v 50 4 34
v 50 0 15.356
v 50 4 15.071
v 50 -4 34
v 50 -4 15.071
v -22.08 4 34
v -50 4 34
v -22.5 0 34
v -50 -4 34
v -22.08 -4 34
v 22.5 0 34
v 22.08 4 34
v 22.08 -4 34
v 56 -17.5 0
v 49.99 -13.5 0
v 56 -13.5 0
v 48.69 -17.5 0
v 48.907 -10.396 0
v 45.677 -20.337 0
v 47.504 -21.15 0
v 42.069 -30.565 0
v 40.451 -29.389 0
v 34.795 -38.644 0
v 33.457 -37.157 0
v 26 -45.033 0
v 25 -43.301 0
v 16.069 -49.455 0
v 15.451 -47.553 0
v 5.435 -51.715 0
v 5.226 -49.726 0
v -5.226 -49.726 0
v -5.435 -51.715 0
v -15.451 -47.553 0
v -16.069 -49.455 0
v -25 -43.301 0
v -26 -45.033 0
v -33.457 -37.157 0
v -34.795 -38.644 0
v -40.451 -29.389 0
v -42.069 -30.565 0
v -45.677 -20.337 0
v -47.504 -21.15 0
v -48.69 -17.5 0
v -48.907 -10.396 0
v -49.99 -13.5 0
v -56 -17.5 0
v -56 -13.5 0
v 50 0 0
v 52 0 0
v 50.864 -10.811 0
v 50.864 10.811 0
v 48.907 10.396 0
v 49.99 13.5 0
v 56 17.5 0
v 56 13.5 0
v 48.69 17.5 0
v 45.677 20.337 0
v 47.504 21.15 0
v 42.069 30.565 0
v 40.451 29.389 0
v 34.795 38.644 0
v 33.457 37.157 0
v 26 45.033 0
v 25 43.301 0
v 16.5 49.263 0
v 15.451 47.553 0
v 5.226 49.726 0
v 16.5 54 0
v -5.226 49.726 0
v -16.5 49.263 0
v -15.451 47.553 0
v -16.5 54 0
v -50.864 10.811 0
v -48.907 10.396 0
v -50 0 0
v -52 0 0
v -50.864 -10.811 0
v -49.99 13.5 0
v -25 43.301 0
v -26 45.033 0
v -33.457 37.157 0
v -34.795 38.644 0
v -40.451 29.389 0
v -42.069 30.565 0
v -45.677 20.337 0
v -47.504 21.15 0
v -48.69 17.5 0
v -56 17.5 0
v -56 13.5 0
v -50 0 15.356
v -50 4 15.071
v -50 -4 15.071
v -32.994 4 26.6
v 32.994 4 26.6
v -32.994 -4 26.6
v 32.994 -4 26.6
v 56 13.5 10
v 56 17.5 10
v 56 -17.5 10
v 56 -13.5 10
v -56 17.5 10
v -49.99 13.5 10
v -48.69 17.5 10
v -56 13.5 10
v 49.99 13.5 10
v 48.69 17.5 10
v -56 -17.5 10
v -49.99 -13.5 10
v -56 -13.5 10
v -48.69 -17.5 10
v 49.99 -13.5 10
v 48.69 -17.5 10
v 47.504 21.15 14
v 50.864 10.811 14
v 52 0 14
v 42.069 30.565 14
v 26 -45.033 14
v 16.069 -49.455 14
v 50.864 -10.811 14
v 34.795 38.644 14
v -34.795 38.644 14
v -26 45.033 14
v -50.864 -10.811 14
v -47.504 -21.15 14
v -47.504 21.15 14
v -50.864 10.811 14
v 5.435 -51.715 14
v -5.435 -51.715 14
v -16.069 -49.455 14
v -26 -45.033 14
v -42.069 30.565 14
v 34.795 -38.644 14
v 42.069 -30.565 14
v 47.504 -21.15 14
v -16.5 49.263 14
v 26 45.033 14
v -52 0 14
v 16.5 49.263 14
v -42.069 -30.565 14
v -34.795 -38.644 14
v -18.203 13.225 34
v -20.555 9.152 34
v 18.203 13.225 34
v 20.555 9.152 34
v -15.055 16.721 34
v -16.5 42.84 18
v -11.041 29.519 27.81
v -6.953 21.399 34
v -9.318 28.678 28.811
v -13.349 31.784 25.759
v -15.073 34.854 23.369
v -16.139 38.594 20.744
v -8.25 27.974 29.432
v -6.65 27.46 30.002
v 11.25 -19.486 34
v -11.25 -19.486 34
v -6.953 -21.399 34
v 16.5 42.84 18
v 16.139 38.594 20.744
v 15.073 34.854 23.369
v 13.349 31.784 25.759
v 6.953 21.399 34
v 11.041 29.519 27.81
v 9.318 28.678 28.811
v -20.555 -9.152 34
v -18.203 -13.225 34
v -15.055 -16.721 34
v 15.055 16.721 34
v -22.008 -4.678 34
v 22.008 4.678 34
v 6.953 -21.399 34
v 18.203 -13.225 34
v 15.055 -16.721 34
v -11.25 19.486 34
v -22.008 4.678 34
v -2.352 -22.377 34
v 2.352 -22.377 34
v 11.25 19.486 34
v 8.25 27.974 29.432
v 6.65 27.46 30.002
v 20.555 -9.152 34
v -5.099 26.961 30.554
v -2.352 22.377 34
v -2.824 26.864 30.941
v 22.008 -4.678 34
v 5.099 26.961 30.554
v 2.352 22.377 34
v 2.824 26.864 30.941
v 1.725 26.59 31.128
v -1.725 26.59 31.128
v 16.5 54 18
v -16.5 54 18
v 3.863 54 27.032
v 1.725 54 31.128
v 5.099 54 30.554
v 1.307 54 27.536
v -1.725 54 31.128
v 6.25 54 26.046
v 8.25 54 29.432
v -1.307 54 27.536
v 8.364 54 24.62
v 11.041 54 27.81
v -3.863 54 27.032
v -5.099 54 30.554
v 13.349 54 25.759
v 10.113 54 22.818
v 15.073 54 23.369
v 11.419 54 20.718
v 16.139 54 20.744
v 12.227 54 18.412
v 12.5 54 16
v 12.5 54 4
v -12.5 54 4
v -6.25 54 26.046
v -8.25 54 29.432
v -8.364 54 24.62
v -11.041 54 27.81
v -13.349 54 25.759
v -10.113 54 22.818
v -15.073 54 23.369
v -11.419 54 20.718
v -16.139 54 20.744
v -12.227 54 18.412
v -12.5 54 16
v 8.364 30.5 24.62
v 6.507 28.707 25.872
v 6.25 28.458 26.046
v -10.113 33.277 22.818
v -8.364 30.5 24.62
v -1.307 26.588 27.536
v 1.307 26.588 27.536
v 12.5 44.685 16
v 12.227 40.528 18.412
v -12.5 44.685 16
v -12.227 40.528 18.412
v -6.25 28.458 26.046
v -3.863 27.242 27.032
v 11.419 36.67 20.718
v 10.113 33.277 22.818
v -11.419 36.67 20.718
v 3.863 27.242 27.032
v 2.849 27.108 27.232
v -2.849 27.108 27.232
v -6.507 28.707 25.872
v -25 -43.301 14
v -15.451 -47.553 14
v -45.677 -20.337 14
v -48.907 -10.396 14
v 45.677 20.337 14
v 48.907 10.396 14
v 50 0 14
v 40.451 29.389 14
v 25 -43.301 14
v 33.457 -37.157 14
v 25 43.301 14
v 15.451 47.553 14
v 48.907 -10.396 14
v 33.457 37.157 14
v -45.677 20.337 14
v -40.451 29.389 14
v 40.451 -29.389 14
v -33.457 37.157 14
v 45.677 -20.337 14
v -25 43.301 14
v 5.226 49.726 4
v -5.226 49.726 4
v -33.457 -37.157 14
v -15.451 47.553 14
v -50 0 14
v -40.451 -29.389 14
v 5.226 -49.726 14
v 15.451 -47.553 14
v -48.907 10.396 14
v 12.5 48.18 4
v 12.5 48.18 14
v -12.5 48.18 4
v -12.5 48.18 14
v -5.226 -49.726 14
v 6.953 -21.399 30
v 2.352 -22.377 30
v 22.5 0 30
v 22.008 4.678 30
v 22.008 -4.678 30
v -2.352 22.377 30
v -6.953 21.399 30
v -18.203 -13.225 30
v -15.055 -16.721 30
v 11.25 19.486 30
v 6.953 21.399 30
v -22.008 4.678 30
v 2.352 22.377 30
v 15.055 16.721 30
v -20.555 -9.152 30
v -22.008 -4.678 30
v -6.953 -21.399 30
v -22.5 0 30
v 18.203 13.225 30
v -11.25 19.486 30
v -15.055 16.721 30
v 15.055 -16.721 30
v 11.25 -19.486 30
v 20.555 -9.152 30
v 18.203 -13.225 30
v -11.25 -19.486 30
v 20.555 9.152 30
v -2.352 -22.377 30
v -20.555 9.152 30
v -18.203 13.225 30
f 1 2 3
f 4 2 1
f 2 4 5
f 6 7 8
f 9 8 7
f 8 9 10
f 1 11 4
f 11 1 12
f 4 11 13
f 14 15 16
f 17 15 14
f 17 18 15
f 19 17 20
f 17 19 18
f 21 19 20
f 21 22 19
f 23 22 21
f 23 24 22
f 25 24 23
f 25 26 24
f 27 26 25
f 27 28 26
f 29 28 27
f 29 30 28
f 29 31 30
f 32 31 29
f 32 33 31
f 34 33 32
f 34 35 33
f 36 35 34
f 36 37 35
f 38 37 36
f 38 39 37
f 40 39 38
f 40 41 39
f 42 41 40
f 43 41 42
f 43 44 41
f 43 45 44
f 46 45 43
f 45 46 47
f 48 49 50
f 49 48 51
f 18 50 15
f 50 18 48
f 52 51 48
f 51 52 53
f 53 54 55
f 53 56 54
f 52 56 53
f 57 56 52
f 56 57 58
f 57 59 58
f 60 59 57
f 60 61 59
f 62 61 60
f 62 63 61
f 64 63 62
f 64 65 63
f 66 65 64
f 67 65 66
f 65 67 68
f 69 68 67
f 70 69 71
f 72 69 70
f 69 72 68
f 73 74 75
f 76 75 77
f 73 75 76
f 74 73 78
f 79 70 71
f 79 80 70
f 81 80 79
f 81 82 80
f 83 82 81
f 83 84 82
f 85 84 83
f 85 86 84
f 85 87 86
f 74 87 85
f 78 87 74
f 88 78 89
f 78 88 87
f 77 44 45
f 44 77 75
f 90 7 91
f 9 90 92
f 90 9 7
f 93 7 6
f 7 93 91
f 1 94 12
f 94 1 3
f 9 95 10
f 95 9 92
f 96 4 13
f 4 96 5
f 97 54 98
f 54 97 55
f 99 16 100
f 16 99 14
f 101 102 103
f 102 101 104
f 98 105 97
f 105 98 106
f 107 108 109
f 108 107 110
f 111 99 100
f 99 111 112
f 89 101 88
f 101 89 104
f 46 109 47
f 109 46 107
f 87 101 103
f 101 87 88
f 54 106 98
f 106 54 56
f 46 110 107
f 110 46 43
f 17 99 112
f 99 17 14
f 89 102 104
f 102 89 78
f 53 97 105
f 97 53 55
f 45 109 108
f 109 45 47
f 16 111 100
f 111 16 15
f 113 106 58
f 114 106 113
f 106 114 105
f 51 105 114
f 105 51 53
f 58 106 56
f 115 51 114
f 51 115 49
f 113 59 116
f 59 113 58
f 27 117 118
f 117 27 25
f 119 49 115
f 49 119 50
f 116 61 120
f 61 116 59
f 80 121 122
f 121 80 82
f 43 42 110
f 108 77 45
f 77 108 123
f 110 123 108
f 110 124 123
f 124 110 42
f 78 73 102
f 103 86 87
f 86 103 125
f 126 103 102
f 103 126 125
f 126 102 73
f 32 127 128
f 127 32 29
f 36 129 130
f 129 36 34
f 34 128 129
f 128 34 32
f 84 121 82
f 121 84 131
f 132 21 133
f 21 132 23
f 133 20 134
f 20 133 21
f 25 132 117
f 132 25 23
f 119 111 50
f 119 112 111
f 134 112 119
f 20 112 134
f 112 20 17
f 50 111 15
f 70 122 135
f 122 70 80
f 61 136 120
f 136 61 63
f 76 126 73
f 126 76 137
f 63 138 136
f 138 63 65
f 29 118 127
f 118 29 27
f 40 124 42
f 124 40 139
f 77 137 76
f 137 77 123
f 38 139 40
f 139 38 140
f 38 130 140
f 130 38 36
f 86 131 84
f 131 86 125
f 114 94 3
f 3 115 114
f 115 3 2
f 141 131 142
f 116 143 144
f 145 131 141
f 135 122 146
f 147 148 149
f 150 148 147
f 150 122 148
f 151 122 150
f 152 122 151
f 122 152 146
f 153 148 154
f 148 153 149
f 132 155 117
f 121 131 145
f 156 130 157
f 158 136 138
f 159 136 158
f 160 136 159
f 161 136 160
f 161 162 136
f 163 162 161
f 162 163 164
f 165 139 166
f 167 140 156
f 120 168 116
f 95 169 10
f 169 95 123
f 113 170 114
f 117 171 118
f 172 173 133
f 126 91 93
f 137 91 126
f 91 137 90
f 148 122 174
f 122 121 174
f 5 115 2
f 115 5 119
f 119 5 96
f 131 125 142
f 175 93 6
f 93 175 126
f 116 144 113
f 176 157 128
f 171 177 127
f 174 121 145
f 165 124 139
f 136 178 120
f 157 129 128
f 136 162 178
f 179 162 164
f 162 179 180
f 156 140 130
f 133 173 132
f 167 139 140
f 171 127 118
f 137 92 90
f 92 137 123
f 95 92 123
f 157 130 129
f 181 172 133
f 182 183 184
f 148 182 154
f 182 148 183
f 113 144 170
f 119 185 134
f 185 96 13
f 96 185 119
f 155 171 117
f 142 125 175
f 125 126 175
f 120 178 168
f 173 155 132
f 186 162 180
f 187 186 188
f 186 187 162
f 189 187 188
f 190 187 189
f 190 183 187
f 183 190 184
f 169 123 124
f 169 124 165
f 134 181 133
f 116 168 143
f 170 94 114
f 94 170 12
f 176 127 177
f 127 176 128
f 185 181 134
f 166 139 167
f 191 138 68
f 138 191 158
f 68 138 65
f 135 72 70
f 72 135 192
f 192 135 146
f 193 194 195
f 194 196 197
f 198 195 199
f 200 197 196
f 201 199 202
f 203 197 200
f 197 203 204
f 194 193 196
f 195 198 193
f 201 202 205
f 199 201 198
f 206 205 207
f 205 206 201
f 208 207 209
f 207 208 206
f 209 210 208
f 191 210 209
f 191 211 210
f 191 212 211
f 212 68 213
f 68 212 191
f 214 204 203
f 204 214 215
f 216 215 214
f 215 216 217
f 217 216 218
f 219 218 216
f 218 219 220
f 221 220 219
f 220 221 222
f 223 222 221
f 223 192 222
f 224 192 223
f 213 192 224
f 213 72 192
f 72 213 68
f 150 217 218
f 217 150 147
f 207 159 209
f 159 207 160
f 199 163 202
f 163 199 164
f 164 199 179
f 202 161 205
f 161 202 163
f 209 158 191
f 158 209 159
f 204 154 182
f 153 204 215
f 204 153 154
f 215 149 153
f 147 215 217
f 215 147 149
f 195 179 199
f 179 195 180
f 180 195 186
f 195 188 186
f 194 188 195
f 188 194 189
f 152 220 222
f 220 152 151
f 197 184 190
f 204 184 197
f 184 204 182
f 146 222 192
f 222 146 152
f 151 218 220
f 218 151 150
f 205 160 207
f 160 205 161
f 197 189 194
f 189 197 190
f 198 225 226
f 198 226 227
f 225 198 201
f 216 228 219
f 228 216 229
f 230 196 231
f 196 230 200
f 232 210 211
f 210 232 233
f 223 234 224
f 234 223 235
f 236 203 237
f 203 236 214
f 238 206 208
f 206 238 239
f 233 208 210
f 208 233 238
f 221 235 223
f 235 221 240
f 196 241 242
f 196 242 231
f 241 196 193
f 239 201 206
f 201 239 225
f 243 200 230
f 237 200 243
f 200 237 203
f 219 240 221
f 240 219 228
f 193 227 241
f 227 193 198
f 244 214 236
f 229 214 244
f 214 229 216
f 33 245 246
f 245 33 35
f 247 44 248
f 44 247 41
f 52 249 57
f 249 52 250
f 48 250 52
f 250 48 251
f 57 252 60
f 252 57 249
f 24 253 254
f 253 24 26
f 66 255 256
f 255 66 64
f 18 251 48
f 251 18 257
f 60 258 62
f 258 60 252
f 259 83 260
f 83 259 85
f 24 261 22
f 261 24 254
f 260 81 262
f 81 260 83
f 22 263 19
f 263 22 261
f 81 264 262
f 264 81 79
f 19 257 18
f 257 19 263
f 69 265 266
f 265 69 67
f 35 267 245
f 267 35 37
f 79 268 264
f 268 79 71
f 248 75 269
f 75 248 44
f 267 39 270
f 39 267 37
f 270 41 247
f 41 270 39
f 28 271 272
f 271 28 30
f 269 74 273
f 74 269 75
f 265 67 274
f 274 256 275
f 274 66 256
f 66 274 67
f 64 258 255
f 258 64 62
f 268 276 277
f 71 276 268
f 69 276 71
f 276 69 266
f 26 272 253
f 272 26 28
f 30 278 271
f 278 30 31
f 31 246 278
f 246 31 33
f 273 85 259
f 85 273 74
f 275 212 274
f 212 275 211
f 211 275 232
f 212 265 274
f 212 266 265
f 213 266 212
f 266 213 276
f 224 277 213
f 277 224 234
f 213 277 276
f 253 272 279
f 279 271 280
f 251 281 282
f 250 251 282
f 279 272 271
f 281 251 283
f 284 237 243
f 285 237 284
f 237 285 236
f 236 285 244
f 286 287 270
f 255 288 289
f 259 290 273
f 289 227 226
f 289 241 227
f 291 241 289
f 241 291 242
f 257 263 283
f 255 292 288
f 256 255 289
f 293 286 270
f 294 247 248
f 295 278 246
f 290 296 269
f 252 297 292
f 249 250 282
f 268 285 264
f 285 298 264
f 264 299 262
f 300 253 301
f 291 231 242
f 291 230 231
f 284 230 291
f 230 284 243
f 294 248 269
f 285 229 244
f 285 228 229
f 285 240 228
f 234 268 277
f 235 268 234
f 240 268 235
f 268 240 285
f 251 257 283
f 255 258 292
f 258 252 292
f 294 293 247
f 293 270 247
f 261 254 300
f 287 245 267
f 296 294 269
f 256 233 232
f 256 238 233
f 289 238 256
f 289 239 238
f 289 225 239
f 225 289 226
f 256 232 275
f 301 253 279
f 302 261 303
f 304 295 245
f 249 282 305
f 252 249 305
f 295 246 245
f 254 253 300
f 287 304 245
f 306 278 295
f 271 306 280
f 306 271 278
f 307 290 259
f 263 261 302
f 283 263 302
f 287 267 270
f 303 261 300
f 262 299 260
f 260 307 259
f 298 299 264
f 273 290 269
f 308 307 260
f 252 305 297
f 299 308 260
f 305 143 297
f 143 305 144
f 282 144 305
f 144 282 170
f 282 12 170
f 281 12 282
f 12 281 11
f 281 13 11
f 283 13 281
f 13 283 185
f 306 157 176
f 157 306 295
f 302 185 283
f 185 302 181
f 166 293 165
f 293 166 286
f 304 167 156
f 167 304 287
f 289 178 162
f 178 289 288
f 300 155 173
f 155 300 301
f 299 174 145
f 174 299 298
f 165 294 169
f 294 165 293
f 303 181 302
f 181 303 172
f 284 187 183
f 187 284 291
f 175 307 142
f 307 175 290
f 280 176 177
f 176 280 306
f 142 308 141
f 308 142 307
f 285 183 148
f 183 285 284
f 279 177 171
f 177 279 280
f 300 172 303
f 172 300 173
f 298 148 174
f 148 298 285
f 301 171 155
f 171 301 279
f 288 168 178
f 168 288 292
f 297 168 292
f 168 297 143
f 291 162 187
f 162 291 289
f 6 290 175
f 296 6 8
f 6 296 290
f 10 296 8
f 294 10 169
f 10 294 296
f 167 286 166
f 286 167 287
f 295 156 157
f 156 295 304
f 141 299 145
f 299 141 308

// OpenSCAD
grinder_d = 100;
grinder_h = 4.5;
bracket_inner_w = 104;
bracket_inner_d = 34;
bracket_inner_h = 27;
T = 4;

grinder2_h = 14;
grinder2_top_d = 45;


shoot_w = 25;
shoot_h = 4;
shoot_d = 18;
shoot_oval = .8;


difference() {
    union() {
        cylinder(grinder2_h, bracket_inner_w/2, bracket_inner_w/2);
        //cylinder(grinder_h, bracket_inner_w/2, bracket_inner_w/2);
        
        difference() {
            union() {
                translate([-(grinder_d)/2, -(8)/2, 0])
                cube([grinder_d, 8, bracket_inner_d]);
                translate([-(bracket_inner_w+2*T)/2, -(bracket_inner_h+2*T)/2, 0])
                cube([bracket_inner_w+2*T, bracket_inner_h+2*T, 10]);
            }
            translate([-(bracket_inner_w+2*T)/2, -(bracket_inner_h)/2, 0])
            cube([bracket_inner_w+2*T, bracket_inner_h, 10]);
        }

        translate([0,0,grinder2_h])
        cylinder(bracket_inner_d-grinder2_h, bracket_inner_w/2, grinder2_top_d/2);
        
        // chute
        translate([-(shoot_w+2*T)/2,0,0])
        cube([shoot_w+2*T, shoot_h+grinder_d/2, shoot_d]);
        translate([0,0,shoot_d]) rotate([-90,0,0]) scale([1,shoot_oval,1])
        cylinder(shoot_h+grinder_d/2, shoot_w/2+T, shoot_w/2+T);
    }
    translate([0,0,-1]) cylinder(grinder2_h+1, grinder_d/2, grinder_d/2);
    //translate([0,0,grinder_h+3]) rotate_extrude() translate([grinder_d/2-3,0,0]) circle(4, $fn=20);
    
    // chute hole
    translate([-(shoot_w)/2,0,T])
    cube([shoot_w, shoot_h+10+grinder_d/2, shoot_d-1.5*T]);
    translate([0,0,shoot_d-T/2]) rotate([-90,0,0]) scale([1,shoot_oval*(shoot_w+T)/shoot_w,1])
    intersection() {
        translate([-shoot_w/2,-shoot_w/2,0])
        cube([shoot_w,shoot_w/2,shoot_h+grinder_d/2]);
        cylinder(shoot_h+grinder_d/2, shoot_w/2, shoot_w/2);
    }

    translate([0,0,grinder2_h])
    cylinder(bracket_inner_d-grinder2_h-T, grinder_d/2, grinder2_top_d/2);

    cylinder(100, grinder2_top_d/2, grinder2_top_d/2);
    
    translate([-300,-300,-300])
    cube([600,600,300]);

}
